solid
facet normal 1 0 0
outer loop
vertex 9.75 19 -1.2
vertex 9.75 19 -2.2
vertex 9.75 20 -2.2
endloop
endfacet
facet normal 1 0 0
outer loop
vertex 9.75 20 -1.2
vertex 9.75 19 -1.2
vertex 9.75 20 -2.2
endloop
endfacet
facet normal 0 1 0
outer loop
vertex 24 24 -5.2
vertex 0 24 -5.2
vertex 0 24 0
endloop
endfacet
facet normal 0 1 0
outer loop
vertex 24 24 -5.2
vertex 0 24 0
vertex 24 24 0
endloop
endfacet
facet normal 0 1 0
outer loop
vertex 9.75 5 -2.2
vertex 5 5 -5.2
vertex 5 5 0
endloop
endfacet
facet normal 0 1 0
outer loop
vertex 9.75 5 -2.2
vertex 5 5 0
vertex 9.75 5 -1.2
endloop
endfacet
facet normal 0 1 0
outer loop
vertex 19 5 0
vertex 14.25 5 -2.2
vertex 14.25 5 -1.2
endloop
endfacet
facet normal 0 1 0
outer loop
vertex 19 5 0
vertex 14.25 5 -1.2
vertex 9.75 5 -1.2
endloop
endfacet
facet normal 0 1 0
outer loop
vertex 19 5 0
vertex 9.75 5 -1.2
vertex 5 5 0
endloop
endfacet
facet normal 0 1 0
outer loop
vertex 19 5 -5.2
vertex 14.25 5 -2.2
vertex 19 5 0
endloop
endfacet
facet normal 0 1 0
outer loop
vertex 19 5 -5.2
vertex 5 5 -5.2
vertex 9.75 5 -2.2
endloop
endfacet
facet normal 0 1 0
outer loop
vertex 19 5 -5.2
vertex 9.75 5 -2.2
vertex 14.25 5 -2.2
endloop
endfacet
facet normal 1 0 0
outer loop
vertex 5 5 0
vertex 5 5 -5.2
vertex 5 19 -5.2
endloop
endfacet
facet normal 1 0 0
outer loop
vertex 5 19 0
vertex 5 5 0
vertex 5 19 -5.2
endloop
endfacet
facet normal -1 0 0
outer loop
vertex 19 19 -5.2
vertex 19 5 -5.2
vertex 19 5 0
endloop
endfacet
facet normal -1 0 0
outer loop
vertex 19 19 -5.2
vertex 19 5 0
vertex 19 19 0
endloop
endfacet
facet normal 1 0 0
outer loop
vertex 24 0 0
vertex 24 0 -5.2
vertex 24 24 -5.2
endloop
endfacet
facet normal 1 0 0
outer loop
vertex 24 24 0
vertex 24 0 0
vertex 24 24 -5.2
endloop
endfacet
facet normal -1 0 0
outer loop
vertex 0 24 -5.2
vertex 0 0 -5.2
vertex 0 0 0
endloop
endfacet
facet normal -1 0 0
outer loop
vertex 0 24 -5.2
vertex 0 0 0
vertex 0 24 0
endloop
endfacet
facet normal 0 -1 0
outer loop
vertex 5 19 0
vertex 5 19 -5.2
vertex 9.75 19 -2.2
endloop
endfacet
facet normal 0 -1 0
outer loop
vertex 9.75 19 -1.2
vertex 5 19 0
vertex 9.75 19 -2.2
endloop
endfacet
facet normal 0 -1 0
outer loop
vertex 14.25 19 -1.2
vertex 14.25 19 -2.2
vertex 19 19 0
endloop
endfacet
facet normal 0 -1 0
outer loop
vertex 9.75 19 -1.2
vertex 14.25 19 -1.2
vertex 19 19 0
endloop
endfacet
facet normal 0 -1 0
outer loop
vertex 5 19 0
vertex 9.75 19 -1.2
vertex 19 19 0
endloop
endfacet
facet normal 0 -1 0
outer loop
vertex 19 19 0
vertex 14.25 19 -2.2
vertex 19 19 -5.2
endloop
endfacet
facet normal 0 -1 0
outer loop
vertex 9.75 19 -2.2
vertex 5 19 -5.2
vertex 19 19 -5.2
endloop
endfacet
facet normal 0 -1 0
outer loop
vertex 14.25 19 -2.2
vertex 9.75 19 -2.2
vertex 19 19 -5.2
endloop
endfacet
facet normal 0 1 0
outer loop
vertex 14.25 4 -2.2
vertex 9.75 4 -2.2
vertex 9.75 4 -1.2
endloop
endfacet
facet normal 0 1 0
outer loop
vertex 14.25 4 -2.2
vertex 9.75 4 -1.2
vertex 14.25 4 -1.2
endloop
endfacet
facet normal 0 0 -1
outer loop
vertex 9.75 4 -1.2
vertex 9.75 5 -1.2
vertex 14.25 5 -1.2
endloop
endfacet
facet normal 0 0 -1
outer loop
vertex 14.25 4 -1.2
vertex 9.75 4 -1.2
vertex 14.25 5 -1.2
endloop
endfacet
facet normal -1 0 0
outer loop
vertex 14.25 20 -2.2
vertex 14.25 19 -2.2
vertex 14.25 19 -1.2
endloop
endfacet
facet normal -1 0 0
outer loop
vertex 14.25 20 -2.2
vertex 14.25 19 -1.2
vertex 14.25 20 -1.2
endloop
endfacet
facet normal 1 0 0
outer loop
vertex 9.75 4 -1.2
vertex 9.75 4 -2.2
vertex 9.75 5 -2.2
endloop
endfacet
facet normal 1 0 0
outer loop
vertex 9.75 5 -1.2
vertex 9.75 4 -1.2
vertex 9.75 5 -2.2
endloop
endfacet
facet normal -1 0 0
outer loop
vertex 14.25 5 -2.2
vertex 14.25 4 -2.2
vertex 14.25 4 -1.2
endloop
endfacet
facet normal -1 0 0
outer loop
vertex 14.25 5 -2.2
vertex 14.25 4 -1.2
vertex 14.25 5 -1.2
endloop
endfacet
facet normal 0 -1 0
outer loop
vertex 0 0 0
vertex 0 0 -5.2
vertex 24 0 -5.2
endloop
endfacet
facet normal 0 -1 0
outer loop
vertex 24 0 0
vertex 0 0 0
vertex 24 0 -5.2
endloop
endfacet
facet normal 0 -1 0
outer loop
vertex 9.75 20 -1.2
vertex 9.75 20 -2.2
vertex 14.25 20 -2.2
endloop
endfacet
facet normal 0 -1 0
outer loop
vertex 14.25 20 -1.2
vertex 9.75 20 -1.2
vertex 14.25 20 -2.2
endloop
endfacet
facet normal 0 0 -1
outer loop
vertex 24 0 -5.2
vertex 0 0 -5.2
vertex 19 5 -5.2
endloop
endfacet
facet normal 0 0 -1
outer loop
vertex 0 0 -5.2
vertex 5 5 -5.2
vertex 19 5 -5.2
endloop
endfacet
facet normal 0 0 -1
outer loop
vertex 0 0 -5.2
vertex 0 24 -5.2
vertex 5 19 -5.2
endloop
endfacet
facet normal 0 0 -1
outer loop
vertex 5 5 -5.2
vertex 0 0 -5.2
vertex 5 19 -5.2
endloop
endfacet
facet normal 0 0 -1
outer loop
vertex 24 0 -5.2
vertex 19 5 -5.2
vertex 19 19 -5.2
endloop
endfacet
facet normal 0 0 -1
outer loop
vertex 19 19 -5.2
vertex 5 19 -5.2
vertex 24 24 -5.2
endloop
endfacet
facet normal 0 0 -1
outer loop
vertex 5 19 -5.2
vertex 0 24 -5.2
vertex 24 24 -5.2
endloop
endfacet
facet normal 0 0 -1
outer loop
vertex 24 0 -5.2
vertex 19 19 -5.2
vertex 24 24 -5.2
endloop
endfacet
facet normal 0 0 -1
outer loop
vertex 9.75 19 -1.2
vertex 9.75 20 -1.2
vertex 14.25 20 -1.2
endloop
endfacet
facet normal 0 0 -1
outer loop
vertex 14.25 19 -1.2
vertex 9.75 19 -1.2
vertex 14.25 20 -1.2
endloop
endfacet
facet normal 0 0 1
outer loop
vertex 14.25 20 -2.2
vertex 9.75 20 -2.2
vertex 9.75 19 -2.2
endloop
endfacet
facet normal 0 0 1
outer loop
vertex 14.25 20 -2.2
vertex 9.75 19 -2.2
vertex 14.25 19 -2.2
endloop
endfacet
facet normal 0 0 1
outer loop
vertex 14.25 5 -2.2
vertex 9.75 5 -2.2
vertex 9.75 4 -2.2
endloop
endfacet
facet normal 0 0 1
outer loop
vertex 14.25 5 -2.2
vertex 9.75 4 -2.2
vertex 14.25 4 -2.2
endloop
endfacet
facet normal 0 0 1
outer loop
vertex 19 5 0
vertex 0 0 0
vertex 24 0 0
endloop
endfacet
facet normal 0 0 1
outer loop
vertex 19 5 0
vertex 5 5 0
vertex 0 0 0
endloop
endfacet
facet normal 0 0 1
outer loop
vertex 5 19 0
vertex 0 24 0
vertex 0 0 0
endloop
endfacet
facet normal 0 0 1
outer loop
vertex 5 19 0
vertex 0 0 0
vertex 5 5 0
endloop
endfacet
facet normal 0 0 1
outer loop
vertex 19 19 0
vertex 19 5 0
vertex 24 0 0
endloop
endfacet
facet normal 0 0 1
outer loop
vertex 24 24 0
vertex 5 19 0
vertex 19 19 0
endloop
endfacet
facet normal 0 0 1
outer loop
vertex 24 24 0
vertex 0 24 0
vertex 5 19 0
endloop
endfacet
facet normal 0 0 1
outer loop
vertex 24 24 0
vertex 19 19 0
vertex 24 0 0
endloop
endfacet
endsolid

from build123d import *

# Parameters (mm, degrees)
BOX021_W     = 4.5
BOX021_H     = 1
BOX021_DEPTH = 1
BOX020_W     = 4.5
BOX020_H     = 1
BOX020_DEPTH = 1
BOX019_W     = 14
BOX019_H     = 14
BOX019_DEPTH = 5.2
BOX018_W     = 24
BOX018_H     = 24
BOX018_DEPTH = 5.2


with BuildPart() as slot_top001:
    # Box021 → Box021 (new body)
    with BuildSketch(Plane(origin=(9.75, 19, -2.2), x_dir=(1, 0, 0), z_dir=(0, 0, 1))):
        with Locations((2.25, 0.5)):
            Rectangle(BOX021_W, BOX021_H)
    extrude(amount=BOX021_DEPTH)


with BuildPart() as slot_bottom001:
    # Box020 → Box020 (new body)
    with BuildSketch(Plane(origin=(9.75, 4, -2.2), x_dir=(1, 0, 0), z_dir=(0, 0, 1))):
        with Locations((2.25, 0.5)):
            Rectangle(BOX020_W, BOX020_H)
    extrude(amount=BOX020_DEPTH)


with BuildPart() as cutout001:
    # Box019 → Box019 (new body)
    with BuildSketch(Plane(origin=(5, 5, 0), x_dir=(1, 0, 0), z_dir=(0, 0, 1))):
        with Locations((7, 7)):
            Rectangle(BOX019_W, BOX019_H)
    extrude(amount=BOX019_DEPTH)


with BuildPart() as cut009:
    # Box018 → Box018 (new body)
    with BuildSketch(Plane.XY):
        with Locations((12, 12)):
            Rectangle(BOX018_W, BOX018_H)
    extrude(amount=BOX018_DEPTH)

    # Cut007: cut CutOut001
    add(cutout001.part, mode=Mode.SUBTRACT)


with BuildPart() as cut009_1:
    # Cut007 placement: moved
    add(cut009.part.moved(Location((0, 0, -5.2))))

    # Cut008: cut slot_bottom001
    add(slot_bottom001.part, mode=Mode.SUBTRACT)

    # Cut009: cut slot_top001
    add(slot_top001.part, mode=Mode.SUBTRACT)


solid = cut009_1.part
